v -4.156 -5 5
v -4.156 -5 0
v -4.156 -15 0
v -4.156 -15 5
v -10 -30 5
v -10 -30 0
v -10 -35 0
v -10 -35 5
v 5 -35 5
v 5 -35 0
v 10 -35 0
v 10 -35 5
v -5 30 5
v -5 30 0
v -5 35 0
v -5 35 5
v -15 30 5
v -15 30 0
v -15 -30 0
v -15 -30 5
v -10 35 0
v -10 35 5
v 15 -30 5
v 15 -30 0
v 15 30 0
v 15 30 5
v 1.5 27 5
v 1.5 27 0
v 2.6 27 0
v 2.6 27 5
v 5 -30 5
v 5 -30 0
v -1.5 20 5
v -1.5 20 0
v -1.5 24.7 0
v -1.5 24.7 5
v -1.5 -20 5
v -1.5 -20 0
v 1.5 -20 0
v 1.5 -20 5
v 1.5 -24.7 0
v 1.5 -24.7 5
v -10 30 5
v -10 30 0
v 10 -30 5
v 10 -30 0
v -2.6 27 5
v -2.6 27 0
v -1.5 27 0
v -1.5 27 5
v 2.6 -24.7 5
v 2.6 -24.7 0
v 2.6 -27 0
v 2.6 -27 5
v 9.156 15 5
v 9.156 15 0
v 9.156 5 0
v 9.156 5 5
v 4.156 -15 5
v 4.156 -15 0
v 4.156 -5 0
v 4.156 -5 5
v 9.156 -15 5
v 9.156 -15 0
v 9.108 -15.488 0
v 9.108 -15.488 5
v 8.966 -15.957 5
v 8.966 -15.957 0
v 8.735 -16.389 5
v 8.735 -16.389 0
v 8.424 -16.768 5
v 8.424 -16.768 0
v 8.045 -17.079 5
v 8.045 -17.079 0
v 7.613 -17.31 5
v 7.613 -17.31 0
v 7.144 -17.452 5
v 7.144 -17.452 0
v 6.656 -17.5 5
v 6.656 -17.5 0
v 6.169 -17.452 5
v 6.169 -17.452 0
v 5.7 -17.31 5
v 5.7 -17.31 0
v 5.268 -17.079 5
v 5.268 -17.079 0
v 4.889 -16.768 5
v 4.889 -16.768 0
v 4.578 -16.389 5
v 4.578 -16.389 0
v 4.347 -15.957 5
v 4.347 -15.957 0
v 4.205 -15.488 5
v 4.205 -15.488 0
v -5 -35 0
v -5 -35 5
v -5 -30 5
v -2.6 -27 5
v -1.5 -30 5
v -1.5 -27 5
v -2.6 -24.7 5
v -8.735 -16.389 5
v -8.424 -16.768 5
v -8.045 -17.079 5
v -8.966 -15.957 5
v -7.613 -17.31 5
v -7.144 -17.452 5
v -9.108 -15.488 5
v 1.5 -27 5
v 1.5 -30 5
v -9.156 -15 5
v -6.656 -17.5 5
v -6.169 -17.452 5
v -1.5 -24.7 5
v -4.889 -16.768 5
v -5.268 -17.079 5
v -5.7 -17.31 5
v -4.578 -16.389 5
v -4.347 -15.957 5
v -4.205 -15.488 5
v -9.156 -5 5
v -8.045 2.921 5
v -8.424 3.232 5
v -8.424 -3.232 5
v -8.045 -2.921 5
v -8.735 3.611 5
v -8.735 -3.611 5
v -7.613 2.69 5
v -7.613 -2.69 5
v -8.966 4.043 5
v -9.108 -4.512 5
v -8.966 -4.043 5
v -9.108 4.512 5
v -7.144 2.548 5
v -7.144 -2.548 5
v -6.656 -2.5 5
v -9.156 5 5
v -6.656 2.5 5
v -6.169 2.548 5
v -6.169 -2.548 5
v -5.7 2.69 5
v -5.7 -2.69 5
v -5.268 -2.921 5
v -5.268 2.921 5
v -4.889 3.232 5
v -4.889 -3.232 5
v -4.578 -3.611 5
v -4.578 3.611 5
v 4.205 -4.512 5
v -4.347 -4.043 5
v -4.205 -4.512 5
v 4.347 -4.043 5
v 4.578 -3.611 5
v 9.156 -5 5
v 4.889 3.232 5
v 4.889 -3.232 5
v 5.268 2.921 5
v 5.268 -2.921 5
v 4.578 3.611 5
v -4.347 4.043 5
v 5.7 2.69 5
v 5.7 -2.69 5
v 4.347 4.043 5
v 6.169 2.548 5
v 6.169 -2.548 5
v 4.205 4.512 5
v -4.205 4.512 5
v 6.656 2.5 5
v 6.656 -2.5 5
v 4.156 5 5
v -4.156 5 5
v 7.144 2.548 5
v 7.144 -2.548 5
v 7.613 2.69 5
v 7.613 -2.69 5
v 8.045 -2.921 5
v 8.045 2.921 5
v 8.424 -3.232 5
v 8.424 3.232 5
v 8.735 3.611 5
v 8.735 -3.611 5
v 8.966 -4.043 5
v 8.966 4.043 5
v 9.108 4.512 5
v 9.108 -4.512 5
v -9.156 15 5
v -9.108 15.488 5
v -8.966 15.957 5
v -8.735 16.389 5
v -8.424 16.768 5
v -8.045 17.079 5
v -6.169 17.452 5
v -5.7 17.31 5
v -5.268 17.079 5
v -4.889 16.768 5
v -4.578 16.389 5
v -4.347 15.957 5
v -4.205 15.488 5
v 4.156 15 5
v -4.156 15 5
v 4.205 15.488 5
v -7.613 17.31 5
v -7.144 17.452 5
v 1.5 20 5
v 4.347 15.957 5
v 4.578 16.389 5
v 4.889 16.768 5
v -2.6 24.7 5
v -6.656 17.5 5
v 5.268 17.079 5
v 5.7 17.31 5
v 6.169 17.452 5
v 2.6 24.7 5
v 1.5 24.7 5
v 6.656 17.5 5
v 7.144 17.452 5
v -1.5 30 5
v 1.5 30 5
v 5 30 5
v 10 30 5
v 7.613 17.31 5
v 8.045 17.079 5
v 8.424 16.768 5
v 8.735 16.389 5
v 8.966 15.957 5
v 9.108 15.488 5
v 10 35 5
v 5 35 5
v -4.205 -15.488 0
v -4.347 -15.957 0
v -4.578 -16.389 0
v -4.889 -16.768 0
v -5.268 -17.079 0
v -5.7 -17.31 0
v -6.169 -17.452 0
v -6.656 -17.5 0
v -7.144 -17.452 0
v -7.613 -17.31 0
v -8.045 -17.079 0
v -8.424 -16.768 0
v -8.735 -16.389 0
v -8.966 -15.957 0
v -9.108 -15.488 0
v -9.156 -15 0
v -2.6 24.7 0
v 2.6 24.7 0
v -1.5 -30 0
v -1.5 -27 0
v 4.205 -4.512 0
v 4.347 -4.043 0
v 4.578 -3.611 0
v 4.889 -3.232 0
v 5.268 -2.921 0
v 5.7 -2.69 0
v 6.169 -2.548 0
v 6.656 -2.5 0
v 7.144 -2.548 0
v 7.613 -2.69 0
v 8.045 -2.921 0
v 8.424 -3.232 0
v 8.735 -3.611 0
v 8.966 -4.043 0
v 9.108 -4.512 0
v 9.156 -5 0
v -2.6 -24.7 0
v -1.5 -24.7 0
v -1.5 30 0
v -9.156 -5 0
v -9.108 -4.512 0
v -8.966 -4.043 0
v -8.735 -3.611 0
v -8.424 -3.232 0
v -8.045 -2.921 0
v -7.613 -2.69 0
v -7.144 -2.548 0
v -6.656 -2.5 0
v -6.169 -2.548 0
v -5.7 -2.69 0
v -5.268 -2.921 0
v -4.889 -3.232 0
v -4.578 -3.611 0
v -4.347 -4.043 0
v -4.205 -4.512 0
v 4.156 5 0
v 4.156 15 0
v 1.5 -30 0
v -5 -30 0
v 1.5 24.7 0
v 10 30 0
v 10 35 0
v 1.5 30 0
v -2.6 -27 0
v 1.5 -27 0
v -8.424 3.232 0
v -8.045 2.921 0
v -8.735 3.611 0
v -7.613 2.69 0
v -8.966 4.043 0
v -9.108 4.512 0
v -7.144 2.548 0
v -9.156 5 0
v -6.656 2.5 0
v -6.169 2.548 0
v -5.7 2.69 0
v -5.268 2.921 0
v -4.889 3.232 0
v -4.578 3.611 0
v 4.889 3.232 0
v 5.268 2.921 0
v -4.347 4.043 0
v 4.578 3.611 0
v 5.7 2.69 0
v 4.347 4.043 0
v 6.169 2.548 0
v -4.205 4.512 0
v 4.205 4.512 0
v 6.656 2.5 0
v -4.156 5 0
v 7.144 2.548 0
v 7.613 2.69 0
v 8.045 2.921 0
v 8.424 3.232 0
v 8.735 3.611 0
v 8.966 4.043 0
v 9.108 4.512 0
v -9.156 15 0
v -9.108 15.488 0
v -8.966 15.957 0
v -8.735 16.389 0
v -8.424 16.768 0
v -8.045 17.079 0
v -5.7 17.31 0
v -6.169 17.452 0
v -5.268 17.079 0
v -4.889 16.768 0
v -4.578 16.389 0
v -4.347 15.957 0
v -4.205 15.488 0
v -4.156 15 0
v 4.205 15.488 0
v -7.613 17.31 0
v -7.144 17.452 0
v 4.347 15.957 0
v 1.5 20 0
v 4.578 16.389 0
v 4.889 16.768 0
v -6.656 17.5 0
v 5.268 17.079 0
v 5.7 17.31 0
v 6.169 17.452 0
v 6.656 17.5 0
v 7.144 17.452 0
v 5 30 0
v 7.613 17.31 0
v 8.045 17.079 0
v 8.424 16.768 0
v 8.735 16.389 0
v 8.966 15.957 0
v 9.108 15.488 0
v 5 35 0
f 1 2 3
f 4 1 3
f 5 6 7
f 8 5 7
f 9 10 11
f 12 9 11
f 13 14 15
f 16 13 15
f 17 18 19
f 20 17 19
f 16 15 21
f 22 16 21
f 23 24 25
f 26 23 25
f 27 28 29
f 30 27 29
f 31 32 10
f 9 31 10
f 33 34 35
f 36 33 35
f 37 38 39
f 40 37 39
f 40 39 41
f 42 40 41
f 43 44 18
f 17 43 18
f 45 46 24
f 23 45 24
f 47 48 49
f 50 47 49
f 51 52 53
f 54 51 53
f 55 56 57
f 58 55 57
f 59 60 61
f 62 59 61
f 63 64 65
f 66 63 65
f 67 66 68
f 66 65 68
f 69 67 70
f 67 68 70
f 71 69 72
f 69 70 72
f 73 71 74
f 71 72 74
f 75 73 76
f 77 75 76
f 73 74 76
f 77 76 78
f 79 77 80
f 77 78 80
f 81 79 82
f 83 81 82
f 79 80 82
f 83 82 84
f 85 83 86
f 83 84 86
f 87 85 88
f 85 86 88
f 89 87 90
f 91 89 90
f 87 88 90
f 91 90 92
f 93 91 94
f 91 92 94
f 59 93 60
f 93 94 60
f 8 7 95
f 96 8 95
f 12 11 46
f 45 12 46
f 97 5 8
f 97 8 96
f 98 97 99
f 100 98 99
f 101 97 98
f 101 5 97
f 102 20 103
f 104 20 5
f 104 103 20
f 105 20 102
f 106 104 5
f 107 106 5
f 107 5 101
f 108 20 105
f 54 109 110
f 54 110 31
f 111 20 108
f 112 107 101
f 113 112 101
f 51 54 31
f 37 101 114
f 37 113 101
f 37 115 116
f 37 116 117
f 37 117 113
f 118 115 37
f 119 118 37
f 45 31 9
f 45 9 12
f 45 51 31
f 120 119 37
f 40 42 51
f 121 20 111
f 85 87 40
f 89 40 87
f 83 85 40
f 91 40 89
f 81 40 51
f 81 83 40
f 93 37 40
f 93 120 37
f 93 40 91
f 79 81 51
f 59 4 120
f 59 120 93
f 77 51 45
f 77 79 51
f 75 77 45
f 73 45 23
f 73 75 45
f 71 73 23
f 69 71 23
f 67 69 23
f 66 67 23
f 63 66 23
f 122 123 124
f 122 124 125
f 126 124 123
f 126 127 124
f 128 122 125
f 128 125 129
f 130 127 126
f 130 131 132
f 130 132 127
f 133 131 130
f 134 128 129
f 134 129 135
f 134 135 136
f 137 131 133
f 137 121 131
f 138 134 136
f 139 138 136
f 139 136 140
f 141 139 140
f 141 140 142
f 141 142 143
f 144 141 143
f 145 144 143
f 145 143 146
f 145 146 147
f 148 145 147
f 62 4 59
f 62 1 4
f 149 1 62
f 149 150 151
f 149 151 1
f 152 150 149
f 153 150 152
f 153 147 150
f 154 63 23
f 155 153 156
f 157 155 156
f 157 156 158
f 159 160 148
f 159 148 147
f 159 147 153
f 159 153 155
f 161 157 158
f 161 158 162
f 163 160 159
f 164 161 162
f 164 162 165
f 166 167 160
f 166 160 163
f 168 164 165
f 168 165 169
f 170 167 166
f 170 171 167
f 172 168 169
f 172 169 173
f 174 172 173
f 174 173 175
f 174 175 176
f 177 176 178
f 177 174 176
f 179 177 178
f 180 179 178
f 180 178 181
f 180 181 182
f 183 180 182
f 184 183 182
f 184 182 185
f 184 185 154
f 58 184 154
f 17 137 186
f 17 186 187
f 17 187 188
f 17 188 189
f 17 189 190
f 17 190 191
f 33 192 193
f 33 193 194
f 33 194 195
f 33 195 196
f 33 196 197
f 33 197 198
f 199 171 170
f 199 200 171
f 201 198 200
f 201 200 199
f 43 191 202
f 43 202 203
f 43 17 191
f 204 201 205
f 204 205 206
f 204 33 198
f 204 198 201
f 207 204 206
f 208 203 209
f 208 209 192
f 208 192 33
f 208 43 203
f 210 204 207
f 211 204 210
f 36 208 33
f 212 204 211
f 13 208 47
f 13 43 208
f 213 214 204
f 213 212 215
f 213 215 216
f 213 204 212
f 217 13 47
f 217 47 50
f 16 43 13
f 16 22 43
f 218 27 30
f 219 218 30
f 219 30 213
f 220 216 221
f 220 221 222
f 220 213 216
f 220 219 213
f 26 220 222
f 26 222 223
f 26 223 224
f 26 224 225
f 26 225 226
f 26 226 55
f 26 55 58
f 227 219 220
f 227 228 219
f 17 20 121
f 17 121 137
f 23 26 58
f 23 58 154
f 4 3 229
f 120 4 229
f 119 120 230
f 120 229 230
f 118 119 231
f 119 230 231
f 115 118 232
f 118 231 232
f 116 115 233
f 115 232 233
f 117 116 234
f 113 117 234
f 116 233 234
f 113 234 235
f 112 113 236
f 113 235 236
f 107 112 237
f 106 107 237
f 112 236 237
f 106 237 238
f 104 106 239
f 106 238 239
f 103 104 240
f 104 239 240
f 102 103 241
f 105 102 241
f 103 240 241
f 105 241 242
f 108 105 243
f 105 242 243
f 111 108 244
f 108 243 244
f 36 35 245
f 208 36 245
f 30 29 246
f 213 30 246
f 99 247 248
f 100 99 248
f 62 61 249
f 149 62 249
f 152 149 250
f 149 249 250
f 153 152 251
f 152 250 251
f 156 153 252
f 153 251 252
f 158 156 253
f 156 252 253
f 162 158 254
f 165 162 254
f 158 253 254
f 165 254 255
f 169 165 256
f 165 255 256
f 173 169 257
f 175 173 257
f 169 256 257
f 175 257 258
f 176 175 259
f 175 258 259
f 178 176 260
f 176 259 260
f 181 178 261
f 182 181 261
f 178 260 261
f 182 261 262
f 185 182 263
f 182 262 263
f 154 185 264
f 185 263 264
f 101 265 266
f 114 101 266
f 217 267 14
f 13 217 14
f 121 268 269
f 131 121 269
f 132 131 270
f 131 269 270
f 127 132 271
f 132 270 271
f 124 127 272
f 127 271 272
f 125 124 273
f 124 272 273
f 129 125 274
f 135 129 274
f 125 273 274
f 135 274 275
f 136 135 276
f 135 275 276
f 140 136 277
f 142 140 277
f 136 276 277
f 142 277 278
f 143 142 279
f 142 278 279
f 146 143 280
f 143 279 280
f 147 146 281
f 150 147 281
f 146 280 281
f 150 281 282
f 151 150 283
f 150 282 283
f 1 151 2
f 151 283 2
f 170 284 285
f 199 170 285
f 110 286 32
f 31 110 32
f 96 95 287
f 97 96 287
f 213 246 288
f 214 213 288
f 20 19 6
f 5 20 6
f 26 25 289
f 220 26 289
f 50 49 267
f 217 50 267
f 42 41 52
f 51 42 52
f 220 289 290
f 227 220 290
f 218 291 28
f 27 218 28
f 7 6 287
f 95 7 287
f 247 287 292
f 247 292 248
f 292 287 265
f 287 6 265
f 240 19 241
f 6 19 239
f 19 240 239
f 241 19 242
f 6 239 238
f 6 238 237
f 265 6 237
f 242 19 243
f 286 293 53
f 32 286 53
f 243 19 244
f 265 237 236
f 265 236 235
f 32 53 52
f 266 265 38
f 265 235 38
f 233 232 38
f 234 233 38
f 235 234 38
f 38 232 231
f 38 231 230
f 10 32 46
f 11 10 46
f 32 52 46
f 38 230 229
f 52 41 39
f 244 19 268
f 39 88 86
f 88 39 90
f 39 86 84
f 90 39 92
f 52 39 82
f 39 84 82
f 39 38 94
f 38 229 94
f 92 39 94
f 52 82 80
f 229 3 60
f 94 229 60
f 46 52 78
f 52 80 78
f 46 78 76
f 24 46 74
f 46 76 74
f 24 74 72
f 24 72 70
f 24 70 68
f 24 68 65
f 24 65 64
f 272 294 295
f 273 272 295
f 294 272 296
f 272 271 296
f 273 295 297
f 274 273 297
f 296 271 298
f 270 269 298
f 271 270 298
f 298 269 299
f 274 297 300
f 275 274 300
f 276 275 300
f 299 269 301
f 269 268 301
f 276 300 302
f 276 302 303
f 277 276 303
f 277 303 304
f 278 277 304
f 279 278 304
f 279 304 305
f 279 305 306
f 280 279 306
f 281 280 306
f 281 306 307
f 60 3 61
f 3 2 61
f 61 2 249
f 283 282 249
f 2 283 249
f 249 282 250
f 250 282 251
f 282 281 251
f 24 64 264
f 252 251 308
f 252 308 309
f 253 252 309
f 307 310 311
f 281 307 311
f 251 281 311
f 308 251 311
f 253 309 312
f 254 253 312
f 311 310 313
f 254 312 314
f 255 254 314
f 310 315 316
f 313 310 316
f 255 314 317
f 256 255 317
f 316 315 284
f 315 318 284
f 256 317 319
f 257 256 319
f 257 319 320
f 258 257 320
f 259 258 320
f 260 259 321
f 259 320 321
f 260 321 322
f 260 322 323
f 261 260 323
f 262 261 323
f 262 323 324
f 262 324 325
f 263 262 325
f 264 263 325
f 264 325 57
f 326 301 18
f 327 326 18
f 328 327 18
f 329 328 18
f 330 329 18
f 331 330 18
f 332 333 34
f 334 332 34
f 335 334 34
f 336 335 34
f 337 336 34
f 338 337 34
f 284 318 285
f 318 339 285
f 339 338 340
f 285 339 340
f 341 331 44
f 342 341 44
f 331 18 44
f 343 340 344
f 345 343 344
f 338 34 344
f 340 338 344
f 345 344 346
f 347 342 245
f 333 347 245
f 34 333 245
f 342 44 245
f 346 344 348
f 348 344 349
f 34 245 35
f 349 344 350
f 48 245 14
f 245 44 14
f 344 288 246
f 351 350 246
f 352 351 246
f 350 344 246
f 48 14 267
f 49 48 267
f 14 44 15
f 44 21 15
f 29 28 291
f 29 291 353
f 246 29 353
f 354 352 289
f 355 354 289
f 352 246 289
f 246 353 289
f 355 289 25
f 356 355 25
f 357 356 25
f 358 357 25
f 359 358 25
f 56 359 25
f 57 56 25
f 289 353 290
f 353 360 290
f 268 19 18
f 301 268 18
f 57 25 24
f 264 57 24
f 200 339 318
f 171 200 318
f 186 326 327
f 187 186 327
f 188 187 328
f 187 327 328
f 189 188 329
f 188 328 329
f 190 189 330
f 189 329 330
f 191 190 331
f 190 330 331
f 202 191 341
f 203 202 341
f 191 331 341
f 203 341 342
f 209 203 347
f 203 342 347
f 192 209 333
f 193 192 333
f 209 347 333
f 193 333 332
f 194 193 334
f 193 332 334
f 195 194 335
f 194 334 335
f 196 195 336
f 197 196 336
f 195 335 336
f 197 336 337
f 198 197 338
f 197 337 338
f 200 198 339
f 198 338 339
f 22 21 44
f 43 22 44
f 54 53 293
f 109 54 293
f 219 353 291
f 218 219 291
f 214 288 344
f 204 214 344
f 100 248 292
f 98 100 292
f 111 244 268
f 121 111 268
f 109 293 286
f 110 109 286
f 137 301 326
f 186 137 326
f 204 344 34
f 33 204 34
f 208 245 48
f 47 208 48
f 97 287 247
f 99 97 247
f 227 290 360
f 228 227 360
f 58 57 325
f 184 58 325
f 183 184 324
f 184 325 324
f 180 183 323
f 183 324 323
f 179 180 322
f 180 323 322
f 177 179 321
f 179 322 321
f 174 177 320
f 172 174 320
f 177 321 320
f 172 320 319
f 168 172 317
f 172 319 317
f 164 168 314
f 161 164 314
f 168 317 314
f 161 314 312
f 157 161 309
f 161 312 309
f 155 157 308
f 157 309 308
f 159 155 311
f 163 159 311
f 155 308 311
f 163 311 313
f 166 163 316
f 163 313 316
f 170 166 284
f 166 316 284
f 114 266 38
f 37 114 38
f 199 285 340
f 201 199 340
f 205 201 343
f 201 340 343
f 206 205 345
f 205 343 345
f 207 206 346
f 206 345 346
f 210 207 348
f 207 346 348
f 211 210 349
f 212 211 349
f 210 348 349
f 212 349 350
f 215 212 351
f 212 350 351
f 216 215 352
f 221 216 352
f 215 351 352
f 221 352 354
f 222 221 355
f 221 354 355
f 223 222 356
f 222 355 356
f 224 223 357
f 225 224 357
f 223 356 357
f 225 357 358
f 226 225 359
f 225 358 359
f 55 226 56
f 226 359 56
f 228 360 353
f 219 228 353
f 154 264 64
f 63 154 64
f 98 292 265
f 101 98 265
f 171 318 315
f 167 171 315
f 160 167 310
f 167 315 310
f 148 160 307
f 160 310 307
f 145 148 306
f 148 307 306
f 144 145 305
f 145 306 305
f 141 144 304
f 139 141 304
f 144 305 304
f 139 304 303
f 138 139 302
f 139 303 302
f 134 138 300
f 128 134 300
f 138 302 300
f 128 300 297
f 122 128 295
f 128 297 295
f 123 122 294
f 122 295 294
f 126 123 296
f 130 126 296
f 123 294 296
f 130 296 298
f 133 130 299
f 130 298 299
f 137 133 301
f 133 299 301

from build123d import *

# Parameters (mm, degrees)
BOSS_EXTRUDE1_DEPTH = 5


with BuildPart() as part:
    # Sketch1 → Boss-Extrude1 (new body)
    with BuildSketch(Plane.XY):
        Polygon((-10, 30), (-15, 30), (-15, -30), (-10, -30), (-10, -35), (-5, -35), (-5, -30), (-1.5, -30), (-1.5, -27), (-2.6, -27), (-2.6, -24.7), (-1.5, -24.7), (-1.5, -20), (1.5, -20), (1.5, -24.7), (2.6, -24.7), (2.6, -27), (1.5, -27), (1.5, -30), (5, -30), (5, -35), (10, -35), (10, -30), (15, -30), (15, 30), (10, 30), (10, 35), (5, 35), (5, 30), (1.5, 30), (1.5, 27), (2.6, 27), (2.6, 24.7), (1.5, 24.7), (1.5, 20), (-1.5, 20), (-1.5, 24.7), (-2.6, 24.7), (-2.6, 27), (-1.5, 27), (-1.5, 30), (-5, 30), (-5, 35), (-10, 35), align=None)
        with BuildLine():
            ThreePointArc((-4.156470727, -15), (-6.656470727, -17.5), (-9.156470727, -15))
            Line((-9.156470727, -15), (-9.156470727, -5))
            ThreePointArc((-9.156470727, -5), (-6.656470727, -2.5), (-4.156470727, -5))
            Line((-4.156470727, -5), (-4.156470727, -15))
        make_face(mode=Mode.SUBTRACT)
        with BuildLine():
            Line((9.156470727, -5), (9.156470727, -15))
            ThreePointArc((9.156470727, -15), (6.656470727, -17.5), (4.156470727, -15))
            Line((4.156470727, -15), (4.156470727, -5))
            ThreePointArc((4.156470727, -5), (6.656470727, -2.5), (9.156470727, -5))
        make_face(mode=Mode.SUBTRACT)
        with BuildLine():
            Line((-9.156470727, 5), (-9.156470727, 15))
            ThreePointArc((-9.156470727, 15), (-6.656470727, 17.5), (-4.156470727, 15))
            Line((-4.156470727, 15), (-4.156470727, 5))
            ThreePointArc((-4.156470727, 5), (-6.656470727, 2.5), (-9.156470727, 5))
        make_face(mode=Mode.SUBTRACT)
        with BuildLine():
            ThreePointArc((4.156470727, 15), (6.656470727, 17.5), (9.156470727, 15))
            Line((9.156470727, 15), (9.156470727, 5))
            ThreePointArc((9.156470727, 5), (6.656470727, 2.5), (4.156470727, 5))
            Line((4.156470727, 5), (4.156470727, 15))
        make_face(mode=Mode.SUBTRACT)
    extrude(amount=BOSS_EXTRUDE1_DEPTH)


solid = part.part
